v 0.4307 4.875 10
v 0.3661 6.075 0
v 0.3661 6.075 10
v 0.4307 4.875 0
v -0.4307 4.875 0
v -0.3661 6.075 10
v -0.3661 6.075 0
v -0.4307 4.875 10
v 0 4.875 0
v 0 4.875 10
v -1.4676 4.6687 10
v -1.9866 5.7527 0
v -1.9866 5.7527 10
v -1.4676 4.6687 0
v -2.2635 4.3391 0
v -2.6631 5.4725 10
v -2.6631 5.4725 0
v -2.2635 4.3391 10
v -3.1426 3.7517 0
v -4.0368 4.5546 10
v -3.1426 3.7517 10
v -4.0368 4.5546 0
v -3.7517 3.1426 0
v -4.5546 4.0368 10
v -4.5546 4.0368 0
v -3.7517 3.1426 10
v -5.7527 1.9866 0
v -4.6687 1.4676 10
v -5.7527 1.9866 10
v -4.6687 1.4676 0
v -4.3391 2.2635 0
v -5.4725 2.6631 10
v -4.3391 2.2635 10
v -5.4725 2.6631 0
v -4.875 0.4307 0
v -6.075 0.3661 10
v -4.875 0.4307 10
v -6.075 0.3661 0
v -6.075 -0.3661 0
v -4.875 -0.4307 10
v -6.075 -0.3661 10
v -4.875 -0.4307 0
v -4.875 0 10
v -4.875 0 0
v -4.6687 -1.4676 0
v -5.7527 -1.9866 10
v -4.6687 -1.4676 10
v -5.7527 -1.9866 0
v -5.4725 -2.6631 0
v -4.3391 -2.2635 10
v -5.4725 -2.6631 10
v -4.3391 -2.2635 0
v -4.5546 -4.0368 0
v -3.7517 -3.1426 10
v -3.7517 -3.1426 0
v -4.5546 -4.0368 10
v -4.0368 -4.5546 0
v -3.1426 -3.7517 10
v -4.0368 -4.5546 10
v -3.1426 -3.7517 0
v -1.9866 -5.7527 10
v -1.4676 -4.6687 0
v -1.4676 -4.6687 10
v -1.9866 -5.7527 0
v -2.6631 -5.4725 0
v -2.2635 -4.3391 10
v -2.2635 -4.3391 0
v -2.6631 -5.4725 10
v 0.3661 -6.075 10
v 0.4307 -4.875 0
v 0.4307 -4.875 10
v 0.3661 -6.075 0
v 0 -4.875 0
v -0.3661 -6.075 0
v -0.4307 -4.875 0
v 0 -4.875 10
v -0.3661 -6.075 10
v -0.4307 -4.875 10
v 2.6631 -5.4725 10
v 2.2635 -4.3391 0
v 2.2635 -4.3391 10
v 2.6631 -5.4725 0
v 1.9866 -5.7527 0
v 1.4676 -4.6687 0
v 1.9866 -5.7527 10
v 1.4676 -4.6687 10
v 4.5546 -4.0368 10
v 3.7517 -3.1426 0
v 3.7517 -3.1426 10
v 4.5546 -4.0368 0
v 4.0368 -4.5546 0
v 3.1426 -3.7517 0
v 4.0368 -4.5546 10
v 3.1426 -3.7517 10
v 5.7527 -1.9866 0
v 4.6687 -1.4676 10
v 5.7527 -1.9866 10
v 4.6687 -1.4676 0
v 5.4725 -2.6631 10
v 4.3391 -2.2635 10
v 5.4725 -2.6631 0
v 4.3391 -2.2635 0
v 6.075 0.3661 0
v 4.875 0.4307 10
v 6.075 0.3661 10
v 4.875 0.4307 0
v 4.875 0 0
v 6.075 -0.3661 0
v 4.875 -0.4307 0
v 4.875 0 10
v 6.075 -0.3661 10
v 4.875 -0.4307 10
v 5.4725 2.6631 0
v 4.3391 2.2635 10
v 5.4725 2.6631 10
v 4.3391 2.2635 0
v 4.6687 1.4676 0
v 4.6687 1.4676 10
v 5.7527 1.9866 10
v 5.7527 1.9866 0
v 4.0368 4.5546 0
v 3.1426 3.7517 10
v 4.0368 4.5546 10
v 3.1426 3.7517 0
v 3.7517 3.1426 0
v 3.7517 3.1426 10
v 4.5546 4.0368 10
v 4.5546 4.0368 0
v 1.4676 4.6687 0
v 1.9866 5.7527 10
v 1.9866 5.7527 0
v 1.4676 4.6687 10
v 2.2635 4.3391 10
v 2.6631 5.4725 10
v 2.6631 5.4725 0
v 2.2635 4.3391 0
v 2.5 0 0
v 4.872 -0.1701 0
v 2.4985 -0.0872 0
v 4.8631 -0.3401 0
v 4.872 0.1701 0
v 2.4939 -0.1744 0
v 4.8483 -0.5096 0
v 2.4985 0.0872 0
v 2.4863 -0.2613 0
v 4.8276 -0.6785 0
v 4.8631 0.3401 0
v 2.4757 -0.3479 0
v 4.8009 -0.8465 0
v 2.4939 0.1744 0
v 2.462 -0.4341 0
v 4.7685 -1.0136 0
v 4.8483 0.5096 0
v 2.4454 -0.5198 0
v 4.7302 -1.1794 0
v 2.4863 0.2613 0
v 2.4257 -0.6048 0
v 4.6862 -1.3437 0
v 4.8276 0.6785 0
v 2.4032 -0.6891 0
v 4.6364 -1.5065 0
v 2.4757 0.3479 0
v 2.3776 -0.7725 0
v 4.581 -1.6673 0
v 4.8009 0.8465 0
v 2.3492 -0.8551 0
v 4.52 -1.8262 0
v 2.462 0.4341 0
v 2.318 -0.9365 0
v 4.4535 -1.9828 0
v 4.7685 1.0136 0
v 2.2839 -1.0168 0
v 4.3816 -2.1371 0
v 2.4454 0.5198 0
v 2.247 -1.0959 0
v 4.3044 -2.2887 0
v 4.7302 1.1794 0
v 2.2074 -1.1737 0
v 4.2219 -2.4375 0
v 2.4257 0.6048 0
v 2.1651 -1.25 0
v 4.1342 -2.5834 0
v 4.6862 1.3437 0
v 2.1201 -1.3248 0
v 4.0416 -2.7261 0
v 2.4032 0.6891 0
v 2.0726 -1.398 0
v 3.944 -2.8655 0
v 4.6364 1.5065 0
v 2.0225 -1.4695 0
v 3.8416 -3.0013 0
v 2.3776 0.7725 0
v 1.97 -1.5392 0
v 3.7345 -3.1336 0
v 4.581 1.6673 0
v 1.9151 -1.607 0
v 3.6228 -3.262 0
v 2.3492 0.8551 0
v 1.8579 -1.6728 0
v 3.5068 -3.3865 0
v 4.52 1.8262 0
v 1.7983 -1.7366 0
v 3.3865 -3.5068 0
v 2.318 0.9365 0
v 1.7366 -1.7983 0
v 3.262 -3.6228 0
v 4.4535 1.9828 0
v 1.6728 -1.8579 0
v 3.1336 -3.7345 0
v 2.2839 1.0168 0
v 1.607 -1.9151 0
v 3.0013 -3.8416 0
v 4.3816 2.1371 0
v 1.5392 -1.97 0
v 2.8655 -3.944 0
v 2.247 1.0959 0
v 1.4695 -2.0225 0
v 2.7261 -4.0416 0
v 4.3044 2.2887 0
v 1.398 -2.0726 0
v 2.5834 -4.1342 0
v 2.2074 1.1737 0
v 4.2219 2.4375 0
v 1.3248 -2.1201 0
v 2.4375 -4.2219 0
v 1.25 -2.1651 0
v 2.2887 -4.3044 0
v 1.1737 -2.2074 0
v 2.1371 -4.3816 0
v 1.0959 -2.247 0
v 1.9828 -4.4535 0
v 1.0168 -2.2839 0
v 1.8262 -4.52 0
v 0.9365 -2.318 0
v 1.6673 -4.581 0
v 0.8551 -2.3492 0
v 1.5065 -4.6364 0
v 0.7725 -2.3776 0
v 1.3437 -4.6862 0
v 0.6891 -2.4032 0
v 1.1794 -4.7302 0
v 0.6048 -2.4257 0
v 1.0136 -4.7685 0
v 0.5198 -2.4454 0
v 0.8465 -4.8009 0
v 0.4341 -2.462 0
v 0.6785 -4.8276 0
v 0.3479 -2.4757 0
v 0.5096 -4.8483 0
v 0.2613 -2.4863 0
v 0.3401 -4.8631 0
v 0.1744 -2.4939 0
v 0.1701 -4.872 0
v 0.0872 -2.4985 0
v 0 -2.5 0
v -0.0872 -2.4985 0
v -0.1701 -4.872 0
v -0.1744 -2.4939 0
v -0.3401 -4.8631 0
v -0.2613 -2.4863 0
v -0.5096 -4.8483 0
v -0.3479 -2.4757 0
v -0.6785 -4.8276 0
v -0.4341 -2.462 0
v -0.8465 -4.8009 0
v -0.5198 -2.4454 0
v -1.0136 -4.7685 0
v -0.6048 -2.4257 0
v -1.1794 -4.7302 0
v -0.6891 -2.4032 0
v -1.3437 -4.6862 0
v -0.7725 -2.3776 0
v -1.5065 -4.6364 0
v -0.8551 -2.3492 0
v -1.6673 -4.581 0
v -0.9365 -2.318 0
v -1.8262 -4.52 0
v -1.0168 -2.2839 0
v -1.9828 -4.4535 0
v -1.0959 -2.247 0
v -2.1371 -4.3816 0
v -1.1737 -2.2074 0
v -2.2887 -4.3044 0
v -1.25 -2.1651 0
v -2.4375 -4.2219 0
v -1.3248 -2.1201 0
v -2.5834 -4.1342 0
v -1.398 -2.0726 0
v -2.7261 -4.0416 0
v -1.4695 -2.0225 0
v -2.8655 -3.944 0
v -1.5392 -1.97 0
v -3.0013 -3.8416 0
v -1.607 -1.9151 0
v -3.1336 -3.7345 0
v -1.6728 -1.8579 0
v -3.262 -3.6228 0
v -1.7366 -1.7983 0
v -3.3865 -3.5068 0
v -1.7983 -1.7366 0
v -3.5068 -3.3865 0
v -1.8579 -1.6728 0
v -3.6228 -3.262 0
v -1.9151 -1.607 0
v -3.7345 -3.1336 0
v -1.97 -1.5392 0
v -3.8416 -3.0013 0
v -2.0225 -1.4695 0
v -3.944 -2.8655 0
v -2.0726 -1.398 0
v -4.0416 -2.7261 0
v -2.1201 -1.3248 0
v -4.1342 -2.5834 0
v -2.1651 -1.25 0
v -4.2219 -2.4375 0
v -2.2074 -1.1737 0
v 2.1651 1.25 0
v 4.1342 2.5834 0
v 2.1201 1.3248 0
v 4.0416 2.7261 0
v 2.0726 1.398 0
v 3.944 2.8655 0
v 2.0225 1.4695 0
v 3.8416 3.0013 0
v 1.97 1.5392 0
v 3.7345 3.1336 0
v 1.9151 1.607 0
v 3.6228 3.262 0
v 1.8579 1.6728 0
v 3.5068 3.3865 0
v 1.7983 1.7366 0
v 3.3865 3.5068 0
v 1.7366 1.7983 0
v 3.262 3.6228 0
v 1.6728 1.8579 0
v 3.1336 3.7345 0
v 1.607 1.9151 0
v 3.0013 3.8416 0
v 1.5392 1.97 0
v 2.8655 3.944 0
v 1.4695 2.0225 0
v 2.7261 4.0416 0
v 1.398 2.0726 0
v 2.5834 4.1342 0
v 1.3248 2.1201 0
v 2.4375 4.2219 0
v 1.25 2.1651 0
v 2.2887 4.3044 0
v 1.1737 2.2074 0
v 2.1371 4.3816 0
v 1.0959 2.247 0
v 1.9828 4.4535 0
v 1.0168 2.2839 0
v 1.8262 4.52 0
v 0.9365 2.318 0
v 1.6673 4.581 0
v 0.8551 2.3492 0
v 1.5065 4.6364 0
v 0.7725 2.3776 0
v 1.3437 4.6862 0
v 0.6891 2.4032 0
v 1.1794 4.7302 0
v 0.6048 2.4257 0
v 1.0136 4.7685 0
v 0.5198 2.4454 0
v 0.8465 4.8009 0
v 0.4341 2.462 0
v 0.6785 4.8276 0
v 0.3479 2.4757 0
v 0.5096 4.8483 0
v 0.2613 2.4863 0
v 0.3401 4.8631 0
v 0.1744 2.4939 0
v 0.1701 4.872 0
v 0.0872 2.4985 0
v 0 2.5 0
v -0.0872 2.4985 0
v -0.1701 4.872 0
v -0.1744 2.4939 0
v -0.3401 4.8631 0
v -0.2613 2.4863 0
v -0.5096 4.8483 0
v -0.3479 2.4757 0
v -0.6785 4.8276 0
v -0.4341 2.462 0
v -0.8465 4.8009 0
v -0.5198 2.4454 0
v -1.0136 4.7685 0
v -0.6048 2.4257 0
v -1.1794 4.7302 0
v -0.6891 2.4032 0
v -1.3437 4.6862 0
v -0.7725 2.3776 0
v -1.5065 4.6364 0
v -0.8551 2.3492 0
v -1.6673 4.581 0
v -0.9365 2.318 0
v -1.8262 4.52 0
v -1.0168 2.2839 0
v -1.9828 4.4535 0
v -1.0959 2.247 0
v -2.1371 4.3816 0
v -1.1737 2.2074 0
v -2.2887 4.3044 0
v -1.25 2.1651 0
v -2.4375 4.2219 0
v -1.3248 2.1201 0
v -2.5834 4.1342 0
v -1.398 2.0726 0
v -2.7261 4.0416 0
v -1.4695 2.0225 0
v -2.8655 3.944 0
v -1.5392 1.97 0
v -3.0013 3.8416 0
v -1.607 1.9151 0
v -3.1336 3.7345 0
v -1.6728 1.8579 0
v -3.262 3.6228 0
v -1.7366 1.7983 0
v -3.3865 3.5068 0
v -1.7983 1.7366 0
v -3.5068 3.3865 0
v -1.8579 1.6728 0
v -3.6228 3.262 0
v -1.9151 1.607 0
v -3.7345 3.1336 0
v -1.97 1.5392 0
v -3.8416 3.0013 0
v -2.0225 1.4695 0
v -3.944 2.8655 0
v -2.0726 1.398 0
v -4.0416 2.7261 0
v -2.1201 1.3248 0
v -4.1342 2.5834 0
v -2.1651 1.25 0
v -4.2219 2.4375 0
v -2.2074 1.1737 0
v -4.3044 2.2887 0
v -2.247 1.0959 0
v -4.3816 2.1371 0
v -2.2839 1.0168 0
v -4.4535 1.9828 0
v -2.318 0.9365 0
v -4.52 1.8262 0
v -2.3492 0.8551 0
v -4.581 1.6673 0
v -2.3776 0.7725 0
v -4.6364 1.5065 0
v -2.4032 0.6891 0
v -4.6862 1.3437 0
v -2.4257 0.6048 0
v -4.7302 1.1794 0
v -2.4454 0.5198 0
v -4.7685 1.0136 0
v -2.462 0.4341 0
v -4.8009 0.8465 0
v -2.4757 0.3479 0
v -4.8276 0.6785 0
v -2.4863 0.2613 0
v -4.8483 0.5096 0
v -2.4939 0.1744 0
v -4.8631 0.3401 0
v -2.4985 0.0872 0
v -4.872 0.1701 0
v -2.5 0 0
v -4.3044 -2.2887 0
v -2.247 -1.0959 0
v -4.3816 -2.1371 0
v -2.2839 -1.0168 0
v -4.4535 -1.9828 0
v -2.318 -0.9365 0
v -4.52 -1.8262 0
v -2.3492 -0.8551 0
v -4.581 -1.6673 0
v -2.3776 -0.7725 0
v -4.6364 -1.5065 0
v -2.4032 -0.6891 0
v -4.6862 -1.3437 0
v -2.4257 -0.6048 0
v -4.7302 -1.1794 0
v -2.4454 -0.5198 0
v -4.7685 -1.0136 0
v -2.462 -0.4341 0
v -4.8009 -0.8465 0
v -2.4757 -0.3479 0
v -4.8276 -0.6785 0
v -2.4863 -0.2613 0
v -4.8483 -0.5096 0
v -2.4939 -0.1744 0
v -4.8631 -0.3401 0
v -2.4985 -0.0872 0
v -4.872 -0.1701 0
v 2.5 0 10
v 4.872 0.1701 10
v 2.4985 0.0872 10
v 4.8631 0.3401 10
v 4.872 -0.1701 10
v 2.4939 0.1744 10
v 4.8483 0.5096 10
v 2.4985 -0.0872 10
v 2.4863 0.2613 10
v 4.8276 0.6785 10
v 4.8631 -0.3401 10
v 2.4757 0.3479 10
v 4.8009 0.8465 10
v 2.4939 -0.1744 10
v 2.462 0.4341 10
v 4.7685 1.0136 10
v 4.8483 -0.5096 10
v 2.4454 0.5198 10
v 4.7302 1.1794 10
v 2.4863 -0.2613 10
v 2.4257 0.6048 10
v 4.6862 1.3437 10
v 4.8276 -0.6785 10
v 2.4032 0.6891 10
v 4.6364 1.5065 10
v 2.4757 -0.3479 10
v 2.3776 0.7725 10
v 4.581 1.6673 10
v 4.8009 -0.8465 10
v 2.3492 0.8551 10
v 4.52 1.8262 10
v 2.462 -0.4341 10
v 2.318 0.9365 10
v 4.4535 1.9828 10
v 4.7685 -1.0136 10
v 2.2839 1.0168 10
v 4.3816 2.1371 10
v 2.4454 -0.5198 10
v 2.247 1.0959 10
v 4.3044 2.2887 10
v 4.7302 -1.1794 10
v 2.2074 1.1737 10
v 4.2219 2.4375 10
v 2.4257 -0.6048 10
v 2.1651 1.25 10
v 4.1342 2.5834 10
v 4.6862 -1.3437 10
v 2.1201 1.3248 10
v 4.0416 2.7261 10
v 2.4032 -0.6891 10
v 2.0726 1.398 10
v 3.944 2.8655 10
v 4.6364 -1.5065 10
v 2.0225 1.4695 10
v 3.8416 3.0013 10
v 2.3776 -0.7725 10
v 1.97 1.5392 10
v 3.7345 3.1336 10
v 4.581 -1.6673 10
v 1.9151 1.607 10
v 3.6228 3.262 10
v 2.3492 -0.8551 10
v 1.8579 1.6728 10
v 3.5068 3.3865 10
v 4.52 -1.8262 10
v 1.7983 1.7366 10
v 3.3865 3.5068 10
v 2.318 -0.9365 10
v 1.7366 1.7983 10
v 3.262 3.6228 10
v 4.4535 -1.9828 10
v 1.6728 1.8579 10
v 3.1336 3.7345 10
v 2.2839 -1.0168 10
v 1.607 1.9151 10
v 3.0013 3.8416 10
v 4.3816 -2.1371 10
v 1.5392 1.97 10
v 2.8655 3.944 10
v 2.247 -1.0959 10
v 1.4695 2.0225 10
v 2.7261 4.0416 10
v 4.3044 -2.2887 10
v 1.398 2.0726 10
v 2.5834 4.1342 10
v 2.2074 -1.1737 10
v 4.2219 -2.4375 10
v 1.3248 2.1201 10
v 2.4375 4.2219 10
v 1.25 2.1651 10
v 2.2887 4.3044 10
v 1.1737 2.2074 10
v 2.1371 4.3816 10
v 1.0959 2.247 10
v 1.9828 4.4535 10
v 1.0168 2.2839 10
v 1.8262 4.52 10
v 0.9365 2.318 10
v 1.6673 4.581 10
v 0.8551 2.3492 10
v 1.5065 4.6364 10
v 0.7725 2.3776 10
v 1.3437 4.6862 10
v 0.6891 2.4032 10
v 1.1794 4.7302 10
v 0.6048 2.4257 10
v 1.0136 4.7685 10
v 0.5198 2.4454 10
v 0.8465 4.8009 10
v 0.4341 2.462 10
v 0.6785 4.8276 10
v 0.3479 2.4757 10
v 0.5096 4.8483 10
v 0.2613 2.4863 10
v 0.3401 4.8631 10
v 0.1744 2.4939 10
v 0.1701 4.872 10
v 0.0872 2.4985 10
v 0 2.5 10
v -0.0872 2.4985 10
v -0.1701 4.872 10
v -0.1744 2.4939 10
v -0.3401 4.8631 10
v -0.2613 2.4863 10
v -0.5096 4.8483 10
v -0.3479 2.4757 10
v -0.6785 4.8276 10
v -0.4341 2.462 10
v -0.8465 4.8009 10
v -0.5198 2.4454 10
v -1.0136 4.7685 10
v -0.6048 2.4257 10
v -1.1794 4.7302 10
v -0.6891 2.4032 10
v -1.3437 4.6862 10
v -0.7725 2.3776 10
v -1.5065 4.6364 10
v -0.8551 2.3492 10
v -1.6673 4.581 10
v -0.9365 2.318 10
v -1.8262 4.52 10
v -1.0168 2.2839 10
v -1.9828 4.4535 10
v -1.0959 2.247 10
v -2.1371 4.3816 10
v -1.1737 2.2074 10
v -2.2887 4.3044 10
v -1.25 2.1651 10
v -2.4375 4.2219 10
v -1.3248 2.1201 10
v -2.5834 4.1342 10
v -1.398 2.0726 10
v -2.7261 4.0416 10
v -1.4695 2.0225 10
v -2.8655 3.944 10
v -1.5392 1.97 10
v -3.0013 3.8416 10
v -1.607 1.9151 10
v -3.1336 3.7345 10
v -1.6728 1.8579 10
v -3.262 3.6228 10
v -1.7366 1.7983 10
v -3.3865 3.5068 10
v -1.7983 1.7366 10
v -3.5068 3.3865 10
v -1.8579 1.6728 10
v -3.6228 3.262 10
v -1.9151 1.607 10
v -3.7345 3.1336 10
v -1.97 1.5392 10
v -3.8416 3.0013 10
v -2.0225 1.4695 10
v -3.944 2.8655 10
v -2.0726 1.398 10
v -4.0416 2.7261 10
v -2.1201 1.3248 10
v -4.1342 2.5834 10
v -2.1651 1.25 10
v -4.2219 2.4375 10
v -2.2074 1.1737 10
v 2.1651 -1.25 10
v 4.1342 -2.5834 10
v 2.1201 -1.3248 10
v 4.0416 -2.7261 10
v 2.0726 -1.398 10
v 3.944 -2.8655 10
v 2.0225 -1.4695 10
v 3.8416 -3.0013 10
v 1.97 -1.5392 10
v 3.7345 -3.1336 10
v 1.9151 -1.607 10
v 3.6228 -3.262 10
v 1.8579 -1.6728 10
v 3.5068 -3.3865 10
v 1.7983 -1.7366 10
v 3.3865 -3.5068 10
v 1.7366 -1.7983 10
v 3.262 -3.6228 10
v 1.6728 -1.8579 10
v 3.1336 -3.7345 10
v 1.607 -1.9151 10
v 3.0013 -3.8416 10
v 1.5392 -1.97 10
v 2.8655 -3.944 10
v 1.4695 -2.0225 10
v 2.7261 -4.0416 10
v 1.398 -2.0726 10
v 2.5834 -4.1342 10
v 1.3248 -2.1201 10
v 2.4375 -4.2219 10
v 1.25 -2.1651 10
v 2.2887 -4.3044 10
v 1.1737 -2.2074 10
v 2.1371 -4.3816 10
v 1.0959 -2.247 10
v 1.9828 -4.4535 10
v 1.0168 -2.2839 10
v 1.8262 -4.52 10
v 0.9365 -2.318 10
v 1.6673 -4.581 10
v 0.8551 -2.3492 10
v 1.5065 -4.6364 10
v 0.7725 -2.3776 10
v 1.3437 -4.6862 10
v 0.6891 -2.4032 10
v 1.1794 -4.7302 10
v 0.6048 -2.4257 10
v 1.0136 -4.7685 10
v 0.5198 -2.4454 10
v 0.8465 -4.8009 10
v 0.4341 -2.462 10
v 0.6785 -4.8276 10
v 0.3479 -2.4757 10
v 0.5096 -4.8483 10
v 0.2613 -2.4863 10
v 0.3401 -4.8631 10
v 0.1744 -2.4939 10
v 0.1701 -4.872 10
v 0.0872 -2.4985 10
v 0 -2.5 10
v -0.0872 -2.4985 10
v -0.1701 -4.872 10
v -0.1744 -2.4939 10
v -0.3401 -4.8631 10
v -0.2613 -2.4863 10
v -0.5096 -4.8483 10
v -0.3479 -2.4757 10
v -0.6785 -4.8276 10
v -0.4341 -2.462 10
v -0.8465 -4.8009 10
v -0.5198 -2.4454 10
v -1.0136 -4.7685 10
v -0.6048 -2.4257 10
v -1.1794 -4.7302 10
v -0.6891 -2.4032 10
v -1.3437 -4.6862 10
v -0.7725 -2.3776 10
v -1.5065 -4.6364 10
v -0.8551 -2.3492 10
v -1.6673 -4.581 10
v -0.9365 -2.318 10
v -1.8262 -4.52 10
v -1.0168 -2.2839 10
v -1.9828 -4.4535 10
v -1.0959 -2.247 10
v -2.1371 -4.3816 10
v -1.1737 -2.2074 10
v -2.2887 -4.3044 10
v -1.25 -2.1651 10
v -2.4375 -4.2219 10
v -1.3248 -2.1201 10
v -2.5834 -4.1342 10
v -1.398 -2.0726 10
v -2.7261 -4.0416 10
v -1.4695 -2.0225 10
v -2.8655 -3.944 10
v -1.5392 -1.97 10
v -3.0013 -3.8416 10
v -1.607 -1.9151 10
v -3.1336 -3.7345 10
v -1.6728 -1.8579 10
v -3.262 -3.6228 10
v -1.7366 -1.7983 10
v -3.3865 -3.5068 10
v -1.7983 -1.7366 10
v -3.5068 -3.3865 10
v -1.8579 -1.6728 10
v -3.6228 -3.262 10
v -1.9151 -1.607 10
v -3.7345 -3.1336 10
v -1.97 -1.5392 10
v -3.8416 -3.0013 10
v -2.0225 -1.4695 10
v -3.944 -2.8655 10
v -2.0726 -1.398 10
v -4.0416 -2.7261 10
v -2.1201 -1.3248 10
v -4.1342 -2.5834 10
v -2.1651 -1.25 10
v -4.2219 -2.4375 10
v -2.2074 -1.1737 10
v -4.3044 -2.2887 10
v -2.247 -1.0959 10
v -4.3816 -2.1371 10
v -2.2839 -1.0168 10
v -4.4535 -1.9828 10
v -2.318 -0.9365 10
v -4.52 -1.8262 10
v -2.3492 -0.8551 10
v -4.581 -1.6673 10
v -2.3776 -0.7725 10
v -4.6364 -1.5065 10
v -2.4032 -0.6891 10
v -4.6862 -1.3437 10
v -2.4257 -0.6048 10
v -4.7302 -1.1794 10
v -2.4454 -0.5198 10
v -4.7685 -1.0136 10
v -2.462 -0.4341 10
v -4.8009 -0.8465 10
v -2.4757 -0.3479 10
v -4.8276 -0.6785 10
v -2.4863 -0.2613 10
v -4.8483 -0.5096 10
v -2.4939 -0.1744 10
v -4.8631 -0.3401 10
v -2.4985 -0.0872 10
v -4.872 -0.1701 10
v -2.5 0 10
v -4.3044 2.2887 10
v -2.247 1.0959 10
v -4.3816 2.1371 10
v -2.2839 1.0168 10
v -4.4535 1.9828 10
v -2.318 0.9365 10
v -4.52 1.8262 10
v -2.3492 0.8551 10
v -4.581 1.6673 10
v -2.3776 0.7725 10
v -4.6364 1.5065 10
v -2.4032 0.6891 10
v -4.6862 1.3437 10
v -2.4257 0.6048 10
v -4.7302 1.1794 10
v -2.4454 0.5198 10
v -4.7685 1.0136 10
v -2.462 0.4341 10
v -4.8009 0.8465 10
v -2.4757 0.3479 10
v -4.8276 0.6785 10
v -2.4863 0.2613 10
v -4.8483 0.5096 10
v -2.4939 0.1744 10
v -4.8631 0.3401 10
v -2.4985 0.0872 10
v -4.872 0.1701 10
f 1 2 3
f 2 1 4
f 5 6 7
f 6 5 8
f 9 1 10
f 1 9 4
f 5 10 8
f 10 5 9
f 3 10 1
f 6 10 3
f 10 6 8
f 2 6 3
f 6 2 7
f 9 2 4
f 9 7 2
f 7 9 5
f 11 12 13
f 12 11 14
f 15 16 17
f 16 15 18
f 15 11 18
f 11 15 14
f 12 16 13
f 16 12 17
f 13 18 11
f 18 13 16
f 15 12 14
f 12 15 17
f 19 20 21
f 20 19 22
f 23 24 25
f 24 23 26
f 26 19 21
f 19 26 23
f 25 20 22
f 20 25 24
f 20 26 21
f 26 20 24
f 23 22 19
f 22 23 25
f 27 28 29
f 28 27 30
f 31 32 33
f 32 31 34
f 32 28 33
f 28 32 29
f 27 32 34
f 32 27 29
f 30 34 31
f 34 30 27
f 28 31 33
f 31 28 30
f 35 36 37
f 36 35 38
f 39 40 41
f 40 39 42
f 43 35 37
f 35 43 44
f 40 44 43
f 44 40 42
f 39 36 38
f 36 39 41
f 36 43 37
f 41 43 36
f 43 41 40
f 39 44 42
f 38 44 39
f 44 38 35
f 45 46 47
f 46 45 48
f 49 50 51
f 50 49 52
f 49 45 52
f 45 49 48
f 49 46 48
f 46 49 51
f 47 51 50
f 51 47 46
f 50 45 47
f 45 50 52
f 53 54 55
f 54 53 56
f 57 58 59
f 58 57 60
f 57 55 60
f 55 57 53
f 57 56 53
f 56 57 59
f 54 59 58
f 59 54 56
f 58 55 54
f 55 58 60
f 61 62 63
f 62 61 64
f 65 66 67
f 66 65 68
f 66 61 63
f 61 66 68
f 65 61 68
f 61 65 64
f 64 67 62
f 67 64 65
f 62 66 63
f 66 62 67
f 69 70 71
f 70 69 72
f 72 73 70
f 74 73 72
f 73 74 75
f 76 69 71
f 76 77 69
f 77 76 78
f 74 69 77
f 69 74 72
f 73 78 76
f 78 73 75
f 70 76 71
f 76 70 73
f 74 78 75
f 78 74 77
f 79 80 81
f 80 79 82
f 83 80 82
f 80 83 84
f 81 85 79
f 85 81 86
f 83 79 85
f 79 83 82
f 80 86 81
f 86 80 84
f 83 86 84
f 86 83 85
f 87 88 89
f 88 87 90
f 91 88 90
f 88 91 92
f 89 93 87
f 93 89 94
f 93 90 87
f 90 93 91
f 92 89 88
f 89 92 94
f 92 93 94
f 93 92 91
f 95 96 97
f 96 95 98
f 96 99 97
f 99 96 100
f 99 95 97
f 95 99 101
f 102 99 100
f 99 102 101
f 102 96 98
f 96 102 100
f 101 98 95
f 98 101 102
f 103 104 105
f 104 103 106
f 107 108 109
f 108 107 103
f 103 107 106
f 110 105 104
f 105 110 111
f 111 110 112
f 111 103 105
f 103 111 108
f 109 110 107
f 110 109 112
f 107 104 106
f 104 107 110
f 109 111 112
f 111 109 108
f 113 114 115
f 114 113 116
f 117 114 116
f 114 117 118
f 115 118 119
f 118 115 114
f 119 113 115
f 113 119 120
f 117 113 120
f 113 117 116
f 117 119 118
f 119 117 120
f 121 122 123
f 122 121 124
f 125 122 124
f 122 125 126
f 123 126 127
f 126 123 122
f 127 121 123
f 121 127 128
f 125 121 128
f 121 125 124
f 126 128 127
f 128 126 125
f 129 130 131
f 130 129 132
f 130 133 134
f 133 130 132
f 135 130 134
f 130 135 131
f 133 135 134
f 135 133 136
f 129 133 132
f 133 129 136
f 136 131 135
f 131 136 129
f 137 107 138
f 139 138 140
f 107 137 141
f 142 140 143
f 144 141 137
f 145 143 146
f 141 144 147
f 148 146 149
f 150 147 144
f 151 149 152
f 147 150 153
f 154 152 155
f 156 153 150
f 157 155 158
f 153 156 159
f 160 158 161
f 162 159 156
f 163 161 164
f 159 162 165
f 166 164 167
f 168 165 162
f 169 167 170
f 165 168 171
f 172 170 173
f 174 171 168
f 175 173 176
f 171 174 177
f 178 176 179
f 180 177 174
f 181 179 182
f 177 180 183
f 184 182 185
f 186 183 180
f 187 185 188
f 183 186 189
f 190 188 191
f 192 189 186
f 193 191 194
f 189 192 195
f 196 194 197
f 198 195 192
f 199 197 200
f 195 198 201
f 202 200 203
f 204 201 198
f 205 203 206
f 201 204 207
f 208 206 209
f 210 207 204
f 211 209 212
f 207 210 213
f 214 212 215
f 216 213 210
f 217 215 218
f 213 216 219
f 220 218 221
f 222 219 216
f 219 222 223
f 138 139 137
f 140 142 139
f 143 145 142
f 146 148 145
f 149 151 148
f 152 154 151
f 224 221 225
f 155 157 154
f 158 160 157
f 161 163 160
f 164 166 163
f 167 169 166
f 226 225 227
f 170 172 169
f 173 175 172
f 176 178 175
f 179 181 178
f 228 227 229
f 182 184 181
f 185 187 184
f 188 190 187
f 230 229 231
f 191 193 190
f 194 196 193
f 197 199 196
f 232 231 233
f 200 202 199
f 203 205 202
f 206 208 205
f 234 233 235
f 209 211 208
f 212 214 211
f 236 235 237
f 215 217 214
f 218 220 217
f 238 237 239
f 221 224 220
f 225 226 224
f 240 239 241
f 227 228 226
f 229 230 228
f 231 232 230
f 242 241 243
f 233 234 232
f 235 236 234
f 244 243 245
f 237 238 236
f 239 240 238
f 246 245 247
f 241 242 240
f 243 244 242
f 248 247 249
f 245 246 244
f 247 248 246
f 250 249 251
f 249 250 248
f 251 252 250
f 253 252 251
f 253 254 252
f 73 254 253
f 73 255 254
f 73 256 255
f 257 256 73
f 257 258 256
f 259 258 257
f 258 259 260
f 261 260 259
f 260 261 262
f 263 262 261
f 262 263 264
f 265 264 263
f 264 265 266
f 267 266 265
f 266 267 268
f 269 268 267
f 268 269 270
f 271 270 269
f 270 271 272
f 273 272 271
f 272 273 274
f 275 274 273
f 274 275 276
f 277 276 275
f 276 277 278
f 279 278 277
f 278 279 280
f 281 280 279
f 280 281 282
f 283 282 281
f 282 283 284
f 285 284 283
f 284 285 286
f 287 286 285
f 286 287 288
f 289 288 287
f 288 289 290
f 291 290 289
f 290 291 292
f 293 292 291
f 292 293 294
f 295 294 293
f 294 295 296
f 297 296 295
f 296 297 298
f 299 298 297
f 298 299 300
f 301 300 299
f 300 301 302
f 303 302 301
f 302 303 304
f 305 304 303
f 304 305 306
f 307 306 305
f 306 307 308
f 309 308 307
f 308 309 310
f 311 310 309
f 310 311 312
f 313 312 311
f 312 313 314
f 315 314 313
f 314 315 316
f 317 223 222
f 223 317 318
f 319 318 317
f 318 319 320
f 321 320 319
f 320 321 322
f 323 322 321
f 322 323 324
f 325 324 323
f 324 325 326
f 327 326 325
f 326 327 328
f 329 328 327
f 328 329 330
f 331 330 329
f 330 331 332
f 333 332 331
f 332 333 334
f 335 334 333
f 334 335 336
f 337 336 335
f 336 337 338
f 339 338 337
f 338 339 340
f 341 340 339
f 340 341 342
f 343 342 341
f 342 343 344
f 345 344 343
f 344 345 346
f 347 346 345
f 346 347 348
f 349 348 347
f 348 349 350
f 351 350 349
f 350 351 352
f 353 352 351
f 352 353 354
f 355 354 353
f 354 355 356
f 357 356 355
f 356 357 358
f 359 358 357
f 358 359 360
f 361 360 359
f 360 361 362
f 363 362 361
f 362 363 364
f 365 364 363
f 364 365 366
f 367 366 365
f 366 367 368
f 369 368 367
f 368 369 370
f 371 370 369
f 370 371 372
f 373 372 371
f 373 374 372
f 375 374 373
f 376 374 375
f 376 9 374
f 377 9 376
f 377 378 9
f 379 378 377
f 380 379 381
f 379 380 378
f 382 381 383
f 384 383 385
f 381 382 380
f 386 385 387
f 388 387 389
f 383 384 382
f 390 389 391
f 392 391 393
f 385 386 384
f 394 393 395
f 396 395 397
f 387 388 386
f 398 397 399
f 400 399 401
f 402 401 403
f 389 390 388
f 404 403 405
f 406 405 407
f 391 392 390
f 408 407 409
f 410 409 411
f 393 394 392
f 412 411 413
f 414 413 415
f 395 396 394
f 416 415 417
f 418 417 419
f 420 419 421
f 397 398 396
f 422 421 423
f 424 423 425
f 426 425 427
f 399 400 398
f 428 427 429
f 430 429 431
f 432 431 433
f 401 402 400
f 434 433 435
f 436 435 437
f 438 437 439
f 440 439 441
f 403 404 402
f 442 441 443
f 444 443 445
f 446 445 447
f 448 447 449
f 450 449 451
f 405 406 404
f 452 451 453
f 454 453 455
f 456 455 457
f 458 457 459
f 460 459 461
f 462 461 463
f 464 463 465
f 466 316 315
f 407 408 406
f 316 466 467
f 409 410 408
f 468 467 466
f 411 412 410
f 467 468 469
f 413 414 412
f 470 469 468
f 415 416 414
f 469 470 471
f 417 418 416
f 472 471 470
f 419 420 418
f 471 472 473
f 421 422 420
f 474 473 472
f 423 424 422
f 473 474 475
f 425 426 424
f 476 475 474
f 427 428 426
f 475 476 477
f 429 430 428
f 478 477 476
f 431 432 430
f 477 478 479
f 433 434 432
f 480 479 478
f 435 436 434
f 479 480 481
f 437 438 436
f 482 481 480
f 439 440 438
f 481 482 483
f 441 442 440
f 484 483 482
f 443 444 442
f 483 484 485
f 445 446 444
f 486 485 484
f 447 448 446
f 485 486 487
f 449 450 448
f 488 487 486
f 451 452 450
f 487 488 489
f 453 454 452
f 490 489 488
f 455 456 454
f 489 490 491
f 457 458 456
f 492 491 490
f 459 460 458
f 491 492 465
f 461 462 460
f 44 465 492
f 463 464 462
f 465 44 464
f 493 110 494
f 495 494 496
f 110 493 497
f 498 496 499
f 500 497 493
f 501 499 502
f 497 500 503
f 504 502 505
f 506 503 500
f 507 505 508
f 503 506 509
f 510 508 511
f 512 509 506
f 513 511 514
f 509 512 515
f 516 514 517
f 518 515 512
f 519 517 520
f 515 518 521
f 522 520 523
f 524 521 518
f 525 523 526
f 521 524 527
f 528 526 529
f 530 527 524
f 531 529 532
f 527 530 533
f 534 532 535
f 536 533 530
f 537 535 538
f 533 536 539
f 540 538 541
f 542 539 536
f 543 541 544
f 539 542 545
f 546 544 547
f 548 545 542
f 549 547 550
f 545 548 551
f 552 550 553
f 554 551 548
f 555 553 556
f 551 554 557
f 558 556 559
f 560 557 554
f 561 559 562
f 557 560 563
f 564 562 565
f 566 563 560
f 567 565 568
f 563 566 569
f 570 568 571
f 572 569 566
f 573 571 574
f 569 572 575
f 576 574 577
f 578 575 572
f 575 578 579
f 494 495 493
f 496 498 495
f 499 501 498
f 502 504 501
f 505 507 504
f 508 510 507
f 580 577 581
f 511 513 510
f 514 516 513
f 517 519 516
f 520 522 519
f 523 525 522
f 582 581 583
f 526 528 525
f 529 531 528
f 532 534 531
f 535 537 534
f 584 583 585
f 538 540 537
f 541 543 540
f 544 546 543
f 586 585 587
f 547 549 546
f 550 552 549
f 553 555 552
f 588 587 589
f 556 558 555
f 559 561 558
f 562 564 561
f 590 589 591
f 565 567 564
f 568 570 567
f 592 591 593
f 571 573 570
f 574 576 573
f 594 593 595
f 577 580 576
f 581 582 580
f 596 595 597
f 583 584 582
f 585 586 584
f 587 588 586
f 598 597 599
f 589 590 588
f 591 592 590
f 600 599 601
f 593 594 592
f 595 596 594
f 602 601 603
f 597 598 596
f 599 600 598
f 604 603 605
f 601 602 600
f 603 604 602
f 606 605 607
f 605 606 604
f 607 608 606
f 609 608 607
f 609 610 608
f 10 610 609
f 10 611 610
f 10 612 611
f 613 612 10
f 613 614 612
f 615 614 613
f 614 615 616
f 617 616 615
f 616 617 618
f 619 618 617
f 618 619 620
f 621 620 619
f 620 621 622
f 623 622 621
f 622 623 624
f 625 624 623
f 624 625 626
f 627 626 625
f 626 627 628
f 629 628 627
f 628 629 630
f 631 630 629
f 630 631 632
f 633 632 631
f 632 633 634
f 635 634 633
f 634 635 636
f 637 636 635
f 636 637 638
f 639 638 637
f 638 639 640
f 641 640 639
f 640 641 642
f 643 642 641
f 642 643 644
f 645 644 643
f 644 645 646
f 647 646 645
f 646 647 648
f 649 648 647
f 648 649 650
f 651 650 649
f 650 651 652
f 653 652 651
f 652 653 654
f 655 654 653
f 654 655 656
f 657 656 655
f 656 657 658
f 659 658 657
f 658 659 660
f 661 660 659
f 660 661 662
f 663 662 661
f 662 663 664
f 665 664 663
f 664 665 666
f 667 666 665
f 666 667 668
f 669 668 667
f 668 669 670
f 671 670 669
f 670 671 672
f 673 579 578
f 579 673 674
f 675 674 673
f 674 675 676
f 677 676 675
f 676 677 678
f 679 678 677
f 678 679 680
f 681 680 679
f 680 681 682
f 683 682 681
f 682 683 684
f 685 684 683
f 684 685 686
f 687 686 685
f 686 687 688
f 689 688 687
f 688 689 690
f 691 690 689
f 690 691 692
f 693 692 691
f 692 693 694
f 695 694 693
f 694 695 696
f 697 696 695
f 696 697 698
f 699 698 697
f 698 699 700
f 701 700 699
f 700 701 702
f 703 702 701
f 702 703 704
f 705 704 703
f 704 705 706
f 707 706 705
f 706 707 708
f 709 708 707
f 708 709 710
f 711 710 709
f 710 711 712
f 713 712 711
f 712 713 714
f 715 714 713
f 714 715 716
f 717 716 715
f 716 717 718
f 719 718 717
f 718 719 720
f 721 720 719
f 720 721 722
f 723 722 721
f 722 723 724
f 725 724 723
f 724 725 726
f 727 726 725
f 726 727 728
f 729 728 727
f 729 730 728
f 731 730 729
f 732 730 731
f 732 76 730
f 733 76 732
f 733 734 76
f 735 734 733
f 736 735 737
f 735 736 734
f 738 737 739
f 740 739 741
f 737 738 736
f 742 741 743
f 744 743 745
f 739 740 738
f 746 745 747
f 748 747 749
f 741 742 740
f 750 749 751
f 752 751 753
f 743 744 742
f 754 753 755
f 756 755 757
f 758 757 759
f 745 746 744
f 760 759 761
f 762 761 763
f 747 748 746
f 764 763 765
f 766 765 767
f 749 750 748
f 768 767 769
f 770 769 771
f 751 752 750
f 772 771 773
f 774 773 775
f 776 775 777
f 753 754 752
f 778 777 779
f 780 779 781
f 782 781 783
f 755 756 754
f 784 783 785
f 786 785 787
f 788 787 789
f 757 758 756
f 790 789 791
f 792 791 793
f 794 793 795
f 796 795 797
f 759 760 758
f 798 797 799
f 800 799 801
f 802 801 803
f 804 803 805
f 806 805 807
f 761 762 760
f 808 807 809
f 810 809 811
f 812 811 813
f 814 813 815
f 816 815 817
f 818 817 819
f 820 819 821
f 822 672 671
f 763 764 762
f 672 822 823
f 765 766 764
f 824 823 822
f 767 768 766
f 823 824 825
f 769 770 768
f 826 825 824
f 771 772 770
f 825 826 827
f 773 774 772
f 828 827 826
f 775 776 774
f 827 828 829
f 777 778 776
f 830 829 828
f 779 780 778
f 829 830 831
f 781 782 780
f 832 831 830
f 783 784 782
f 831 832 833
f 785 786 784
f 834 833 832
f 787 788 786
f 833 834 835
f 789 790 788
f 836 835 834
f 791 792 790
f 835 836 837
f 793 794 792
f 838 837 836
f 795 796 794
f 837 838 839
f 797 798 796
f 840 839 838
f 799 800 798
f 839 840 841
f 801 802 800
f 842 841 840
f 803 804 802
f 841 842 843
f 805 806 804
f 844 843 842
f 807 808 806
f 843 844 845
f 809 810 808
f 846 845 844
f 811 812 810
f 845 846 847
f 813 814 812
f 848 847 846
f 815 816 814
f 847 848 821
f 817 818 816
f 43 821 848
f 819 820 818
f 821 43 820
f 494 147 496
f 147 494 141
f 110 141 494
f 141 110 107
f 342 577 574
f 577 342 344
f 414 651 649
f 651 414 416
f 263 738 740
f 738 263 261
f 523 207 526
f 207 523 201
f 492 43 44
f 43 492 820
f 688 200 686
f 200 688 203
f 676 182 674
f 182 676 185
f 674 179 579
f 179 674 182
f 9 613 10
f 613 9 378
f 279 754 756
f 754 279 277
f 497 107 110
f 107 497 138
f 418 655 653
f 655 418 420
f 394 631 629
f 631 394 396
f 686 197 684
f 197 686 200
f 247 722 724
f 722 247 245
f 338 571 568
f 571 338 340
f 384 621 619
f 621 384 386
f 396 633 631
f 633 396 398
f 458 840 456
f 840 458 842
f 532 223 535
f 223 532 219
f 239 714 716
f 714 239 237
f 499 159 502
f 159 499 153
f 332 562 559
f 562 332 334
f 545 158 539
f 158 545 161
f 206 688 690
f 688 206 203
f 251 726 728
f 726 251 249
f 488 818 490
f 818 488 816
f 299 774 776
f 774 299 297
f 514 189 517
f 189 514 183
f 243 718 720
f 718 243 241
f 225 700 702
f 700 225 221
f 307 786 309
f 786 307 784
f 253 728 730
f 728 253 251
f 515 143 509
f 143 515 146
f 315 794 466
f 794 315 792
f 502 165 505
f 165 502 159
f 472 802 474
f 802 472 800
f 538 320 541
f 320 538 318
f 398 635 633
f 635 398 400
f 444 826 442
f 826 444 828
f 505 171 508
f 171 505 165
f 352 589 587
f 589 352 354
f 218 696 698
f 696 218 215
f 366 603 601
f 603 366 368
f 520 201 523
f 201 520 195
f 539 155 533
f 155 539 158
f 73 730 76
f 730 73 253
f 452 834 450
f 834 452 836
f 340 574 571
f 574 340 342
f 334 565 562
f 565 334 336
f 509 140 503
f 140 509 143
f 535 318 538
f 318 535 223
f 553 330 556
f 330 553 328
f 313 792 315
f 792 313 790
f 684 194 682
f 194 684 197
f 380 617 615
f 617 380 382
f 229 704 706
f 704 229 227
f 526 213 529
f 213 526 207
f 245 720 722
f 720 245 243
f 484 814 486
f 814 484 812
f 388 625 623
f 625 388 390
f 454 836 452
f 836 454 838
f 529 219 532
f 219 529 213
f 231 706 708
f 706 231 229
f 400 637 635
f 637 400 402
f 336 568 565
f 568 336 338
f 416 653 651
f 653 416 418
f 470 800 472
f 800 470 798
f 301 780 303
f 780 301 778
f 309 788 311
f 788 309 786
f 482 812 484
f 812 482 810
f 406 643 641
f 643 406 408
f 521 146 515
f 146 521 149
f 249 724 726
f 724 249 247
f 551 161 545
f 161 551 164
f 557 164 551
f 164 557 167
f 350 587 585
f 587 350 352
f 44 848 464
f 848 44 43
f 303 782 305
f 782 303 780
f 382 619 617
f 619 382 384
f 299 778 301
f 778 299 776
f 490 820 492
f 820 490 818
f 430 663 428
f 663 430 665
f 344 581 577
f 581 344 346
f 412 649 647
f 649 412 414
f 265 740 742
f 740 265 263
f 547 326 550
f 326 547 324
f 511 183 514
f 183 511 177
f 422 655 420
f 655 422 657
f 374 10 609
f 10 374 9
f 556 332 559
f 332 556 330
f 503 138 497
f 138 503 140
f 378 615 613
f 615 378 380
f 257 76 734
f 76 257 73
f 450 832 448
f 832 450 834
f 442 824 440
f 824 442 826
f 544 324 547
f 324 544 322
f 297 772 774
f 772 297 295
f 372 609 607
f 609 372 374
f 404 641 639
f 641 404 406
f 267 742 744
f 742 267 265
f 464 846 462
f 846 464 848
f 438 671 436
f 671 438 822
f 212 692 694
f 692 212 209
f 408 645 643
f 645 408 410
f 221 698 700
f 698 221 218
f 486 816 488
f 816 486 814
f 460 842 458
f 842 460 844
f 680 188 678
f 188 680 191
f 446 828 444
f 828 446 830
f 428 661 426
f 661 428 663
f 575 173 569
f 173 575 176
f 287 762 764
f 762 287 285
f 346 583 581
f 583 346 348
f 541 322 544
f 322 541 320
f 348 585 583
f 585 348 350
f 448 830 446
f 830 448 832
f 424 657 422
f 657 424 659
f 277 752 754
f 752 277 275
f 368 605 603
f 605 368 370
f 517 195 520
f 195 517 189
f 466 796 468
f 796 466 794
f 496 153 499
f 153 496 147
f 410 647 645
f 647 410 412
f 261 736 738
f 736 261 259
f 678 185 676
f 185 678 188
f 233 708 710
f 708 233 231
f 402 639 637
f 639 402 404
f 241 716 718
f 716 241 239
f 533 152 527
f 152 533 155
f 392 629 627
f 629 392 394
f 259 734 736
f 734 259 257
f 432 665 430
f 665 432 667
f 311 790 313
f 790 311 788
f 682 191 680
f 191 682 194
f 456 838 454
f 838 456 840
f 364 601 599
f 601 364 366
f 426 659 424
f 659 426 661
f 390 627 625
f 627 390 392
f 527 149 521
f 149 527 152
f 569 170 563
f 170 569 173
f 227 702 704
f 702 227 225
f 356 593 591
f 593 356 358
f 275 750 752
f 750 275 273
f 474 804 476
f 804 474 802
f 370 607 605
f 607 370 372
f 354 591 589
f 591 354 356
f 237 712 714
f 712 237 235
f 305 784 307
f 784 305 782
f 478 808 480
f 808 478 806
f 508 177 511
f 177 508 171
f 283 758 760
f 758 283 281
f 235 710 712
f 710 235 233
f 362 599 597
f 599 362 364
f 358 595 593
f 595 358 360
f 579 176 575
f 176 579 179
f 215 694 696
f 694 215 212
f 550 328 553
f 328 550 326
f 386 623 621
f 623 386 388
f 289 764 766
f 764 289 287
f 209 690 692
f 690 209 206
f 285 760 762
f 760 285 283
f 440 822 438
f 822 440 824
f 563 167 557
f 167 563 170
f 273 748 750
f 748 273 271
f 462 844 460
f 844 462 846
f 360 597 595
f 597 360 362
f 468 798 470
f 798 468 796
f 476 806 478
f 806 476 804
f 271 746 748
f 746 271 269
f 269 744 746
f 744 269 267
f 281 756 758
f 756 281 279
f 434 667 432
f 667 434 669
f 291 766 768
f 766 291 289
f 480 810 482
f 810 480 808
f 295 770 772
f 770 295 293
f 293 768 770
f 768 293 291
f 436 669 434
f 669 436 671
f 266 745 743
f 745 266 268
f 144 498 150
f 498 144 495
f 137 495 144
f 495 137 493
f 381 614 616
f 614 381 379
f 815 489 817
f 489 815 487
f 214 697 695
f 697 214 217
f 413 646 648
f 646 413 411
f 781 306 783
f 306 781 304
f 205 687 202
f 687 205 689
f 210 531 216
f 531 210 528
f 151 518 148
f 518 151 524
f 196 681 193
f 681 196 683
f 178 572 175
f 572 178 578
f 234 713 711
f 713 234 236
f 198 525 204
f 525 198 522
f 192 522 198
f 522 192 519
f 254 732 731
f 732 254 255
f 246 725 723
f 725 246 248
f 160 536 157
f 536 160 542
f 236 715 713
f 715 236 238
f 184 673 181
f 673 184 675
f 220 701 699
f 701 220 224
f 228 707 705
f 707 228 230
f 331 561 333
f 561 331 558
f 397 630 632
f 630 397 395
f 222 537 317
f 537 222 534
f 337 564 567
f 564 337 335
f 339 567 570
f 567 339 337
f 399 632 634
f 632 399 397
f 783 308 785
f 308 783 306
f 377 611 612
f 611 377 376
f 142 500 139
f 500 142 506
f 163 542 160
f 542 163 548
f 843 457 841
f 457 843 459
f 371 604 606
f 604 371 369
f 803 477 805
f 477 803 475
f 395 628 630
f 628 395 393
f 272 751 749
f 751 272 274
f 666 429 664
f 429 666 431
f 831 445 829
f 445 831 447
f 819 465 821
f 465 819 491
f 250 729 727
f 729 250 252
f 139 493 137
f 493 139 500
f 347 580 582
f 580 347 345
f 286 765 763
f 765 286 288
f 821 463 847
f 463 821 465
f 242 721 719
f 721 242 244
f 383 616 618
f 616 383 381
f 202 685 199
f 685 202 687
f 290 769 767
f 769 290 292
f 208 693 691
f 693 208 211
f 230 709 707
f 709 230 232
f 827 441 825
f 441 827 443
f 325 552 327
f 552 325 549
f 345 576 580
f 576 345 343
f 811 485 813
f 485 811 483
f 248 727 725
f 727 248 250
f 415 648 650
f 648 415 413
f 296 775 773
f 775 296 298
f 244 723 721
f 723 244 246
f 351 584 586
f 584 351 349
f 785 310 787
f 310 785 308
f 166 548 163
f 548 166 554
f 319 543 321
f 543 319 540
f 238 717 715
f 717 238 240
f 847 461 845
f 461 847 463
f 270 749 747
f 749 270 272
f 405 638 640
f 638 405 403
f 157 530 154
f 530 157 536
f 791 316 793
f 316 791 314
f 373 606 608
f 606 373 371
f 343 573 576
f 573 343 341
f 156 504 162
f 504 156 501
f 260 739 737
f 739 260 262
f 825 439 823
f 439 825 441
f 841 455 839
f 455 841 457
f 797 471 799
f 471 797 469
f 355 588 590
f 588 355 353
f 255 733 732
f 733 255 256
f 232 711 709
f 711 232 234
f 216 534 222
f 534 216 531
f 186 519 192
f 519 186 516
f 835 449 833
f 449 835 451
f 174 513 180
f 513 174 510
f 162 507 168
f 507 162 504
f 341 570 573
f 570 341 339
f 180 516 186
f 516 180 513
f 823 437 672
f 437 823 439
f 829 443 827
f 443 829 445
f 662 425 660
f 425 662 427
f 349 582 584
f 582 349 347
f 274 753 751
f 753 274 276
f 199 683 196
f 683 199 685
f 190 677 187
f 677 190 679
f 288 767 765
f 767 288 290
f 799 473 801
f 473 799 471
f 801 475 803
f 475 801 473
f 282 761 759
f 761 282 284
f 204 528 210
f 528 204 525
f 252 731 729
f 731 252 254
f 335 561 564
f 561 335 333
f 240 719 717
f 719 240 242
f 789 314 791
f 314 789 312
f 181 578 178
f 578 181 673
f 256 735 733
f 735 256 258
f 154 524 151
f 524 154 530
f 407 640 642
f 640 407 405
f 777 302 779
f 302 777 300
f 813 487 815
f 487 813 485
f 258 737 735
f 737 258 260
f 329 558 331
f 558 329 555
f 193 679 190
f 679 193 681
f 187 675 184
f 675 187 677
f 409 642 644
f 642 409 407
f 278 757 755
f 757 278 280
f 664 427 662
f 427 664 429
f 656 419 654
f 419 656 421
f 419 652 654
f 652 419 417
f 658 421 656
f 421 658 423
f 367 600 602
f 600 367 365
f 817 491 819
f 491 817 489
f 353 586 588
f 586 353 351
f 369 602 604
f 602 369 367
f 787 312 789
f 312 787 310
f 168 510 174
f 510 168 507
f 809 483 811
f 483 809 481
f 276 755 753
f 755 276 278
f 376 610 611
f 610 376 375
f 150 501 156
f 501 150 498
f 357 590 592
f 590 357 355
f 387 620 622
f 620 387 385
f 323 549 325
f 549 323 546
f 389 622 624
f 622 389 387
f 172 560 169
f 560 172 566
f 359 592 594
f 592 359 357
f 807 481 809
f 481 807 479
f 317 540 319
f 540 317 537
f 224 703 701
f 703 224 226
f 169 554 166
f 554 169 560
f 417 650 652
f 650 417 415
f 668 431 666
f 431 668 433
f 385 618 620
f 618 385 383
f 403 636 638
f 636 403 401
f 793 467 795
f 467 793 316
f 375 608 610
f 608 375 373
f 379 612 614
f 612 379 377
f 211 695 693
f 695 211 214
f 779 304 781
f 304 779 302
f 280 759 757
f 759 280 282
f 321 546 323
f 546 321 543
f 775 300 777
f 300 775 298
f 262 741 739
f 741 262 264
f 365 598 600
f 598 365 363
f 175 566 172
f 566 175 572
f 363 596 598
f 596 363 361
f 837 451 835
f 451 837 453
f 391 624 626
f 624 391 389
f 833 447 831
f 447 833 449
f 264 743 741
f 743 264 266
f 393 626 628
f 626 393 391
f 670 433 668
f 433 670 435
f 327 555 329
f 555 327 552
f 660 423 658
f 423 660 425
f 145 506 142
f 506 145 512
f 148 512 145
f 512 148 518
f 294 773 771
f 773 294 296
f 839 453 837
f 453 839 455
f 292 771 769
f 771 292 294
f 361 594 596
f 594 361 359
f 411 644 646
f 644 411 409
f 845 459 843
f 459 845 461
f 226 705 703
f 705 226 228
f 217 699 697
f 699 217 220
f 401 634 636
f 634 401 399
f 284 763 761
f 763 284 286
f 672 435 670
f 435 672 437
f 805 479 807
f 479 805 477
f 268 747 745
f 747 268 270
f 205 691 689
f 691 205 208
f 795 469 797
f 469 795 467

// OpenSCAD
$fn = 180;

// Timing pulley (approximate) with 16 teeth and 9.75mm pitch diameter.
// This is a simplified, renderable model: cylindrical body + rectangular teeth.
// Parameters are editable.

teeth = 16;
pitch_d = 9.75;                 // pitch diameter (mm)
pitch_r = pitch_d/2;

pulley_width = 10;              // overall width (mm)
bore_d = 5;                     // center bore (mm)

tooth_height = 1.2;             // radial height above pitch circle (mm)
tooth_root_depth = 0.6;         // radial depth below pitch circle (mm)
tooth_arc_fraction = 0.45;      // fraction of tooth pitch occupied by tooth at pitch radius
tooth_tip_taper = 0.85;         // tip width factor vs base width (0..1)

hub_extra_r = 0.0;              // optional extra radius for hub (mm), 0 = none

// Derived
pitch_circ = PI * pitch_d;
tooth_pitch = pitch_circ / teeth;                 // arc length per tooth at pitch circle
tooth_base_w = tooth_pitch * tooth_arc_fraction;  // chord approx via arc length (small angles)
tooth_tip_w  = tooth_base_w * tooth_tip_taper;

r_root = max(0.1, pitch_r - tooth_root_depth);
r_body = pitch_r;                                 // body up to pitch circle
r_tip  = pitch_r + tooth_height;
r_hub  = r_tip + hub_extra_r;

module tooth_2d() {
    // Trapezoid centered on X axis, extending from r_body to r_tip in Y
    polygon(points=[
        [-tooth_base_w/2, r_body],
        [ tooth_base_w/2, r_body],
        [ tooth_tip_w/2,  r_tip ],
        [-tooth_tip_w/2,  r_tip ]
    ]);
}

module pulley() {
    difference() {
        union() {
            // Root cylinder (below pitch circle)
            cylinder(h=pulley_width, r=r_root);

            // Body cylinder up to pitch circle
            cylinder(h=pulley_width, r=r_body);

            // Teeth
            for (i = [0:teeth-1]) {
                rotate([0,0, i*360/teeth])
                    linear_extrude(height=pulley_width)
                        tooth_2d();
            }

            // Optional hub (if hub_extra_r > 0)
            if (hub_extra_r > 0)
                cylinder(h=pulley_width, r=r_hub);
        }

        // Bore
        translate([0,0,-0.5])
            cylinder(h=pulley_width+1, d=bore_d);
    }
}

pulley();
